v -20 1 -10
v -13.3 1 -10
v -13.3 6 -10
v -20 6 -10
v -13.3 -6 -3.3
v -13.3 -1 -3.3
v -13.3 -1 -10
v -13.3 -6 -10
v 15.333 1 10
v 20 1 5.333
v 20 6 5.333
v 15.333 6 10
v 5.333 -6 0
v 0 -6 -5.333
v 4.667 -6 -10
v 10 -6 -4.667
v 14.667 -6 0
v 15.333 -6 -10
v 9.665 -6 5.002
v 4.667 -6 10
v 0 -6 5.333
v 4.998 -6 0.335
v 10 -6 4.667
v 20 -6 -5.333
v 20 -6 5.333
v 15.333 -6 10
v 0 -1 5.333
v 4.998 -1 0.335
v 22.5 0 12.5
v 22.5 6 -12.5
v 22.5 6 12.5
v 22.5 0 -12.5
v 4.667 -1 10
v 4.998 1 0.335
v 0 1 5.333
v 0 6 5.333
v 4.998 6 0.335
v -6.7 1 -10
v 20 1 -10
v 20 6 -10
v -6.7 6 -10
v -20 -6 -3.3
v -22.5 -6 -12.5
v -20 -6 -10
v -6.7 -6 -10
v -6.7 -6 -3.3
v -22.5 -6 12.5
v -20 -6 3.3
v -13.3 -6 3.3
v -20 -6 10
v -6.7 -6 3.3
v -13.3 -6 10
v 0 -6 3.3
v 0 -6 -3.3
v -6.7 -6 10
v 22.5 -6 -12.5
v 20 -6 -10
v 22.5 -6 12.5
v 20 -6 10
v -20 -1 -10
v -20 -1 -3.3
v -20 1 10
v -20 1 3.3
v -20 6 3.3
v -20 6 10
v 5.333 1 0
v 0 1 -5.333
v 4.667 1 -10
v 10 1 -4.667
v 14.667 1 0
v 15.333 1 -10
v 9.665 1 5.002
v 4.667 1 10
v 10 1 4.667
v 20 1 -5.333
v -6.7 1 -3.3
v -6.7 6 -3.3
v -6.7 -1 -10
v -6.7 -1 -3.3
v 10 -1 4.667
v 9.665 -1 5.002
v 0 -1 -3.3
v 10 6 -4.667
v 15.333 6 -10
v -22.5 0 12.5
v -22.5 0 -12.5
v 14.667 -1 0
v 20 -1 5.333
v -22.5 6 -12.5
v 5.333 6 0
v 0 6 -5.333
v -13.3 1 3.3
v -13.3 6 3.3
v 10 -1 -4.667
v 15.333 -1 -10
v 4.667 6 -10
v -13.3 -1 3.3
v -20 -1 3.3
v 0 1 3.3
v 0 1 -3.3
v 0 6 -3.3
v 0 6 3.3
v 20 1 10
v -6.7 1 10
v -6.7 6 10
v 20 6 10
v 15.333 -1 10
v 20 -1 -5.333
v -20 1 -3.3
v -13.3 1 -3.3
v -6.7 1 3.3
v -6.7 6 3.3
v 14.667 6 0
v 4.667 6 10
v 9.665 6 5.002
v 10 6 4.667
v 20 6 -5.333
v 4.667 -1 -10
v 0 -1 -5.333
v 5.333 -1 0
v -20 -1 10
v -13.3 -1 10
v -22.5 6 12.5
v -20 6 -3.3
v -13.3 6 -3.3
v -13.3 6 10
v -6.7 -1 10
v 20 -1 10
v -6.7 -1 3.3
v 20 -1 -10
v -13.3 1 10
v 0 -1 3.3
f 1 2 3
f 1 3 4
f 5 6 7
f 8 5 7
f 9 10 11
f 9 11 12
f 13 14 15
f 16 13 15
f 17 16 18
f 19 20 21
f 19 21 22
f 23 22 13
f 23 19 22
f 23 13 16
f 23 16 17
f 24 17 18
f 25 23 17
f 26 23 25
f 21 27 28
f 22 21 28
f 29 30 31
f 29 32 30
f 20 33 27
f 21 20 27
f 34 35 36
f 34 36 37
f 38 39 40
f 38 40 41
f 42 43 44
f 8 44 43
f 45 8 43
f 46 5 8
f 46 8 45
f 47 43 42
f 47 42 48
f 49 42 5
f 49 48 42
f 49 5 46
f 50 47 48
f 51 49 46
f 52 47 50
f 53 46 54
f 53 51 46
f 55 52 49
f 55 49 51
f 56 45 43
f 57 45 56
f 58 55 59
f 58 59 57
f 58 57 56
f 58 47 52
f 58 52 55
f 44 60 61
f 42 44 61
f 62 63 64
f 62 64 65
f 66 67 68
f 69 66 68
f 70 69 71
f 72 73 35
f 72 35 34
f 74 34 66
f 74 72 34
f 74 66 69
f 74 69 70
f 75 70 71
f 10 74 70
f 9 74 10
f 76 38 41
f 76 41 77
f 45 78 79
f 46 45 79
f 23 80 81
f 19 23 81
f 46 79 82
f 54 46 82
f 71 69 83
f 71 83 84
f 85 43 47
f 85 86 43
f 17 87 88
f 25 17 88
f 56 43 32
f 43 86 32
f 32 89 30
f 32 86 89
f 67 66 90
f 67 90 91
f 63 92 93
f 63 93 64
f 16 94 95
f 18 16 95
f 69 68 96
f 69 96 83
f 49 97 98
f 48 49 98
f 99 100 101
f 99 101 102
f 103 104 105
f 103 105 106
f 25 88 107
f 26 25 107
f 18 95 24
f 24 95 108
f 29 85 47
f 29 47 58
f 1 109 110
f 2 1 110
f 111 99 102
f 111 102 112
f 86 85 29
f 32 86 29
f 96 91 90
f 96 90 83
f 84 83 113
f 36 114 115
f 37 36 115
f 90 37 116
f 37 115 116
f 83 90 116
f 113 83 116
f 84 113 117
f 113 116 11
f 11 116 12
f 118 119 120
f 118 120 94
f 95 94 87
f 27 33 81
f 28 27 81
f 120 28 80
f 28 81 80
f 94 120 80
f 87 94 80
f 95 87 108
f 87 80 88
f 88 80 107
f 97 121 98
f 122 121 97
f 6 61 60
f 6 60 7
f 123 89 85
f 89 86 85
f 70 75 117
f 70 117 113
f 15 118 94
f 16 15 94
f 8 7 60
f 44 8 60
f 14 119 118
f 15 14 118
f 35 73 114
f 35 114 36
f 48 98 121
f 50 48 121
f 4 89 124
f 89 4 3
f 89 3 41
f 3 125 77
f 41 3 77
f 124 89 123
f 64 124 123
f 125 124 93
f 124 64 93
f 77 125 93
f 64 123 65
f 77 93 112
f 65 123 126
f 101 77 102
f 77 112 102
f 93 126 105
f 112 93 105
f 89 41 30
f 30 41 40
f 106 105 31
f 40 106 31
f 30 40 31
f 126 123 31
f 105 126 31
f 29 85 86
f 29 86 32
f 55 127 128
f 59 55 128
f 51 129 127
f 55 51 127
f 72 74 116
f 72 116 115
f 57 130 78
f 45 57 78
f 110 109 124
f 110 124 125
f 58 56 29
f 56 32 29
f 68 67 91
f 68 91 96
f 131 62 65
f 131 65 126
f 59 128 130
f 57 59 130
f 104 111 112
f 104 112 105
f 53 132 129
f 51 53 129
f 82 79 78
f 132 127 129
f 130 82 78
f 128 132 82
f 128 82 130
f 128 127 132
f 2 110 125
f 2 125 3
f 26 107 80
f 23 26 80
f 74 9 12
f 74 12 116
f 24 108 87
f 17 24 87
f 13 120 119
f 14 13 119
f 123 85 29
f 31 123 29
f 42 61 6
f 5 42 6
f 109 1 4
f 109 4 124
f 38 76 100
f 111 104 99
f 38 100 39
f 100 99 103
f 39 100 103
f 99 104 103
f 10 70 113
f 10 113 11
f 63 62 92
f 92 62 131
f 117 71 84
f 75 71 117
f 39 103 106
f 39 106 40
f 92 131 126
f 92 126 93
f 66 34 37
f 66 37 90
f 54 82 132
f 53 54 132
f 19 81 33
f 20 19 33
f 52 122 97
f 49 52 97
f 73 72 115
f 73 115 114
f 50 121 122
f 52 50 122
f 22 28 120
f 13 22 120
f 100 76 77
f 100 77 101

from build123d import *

# Parameters (mm, degrees)
F0_W     = 45
F0_H     = 25
F1_DEPTH = 1
F2_W     = 45
F2_H     = 25
F3_DEPTH = 5
F4_DEPTH = 5
F5_DEPTH = 5


# Not quite as in the source:
# - ends of sketch curves that miss each other by under 0.0002 mm in the source are joined


with BuildPart() as f1:
    # F0 (on Front) → F1 (new body)
    with BuildSketch(Plane.XZ):
        Rectangle(F0_W, F0_H)
    extrude(amount=F1_DEPTH)

    # F2 (on face) → F3 (join)
    with BuildSketch(Plane.XZ.offset(1)):
        Rectangle(F2_W, F2_H)
        Polygon((-20, 3.3), (-20, 10), (-13.3, 10), (-6.7, 10), (4.6669047558, 10), (15.3330952385, 10), (20, 10), (20, 5.3330952385), (20, -5.3329034452), (20, -10), (15.3329034452, -10), (4.6669112521, -10), (-6.7, -10), (-13.3, -10), (-20, -10), (-20, -3.3), align=None, mode=Mode.SUBTRACT)
    extrude(amount=F3_DEPTH)

    # F2 (on face) → F4 (join)
    with BuildSketch(Plane.XZ.offset(1)):
        Polygon((-6.7, 10), (-13.3, 10), (-13.3, 3.3), (-20, 3.3), (-20, -3.3), (-13.3, -3.3), (-13.3, -10), (-6.7, -10), (-6.7, -3.3), (0, -3.3), (0, 0), (0, 3.3), (-6.7, 3.3), align=None)
    extrude(amount=F4_DEPTH)


with BuildPart() as f5:
    # F2 (on face) → F5 (new body)
    with BuildSketch(Plane.XZ.offset(1)):
        Polygon((9.6650526696, 5.0018520863), (4.6669047558, 10), (0, 5.3330952442), (4.9981479137, 0.3349473304), (5.3329483647, -0.0001468775), (1.29926e-05, -5.3330822516), (4.6669047558, -10), (9.9999041025, -4.6670006553), (15.3329034452, -10), (20, -5.3329034452), (14.6669047548, -4.7e-09), (20, 5.3330952385), (15.3330952385, 10), (9.9999999982, 4.6669047577), align=None)
    extrude(amount=F5_DEPTH)


with BuildPart() as f6_1:
    # F6: instance of F1
    add(f1.part.mirror(Plane.XZ))


with BuildPart() as f6_2:
    # F6: instance of F5
    add(f5.part.mirror(Plane.XZ))


solid = Compound([f1.part, f5.part, f6_1.part, f6_2.part])
